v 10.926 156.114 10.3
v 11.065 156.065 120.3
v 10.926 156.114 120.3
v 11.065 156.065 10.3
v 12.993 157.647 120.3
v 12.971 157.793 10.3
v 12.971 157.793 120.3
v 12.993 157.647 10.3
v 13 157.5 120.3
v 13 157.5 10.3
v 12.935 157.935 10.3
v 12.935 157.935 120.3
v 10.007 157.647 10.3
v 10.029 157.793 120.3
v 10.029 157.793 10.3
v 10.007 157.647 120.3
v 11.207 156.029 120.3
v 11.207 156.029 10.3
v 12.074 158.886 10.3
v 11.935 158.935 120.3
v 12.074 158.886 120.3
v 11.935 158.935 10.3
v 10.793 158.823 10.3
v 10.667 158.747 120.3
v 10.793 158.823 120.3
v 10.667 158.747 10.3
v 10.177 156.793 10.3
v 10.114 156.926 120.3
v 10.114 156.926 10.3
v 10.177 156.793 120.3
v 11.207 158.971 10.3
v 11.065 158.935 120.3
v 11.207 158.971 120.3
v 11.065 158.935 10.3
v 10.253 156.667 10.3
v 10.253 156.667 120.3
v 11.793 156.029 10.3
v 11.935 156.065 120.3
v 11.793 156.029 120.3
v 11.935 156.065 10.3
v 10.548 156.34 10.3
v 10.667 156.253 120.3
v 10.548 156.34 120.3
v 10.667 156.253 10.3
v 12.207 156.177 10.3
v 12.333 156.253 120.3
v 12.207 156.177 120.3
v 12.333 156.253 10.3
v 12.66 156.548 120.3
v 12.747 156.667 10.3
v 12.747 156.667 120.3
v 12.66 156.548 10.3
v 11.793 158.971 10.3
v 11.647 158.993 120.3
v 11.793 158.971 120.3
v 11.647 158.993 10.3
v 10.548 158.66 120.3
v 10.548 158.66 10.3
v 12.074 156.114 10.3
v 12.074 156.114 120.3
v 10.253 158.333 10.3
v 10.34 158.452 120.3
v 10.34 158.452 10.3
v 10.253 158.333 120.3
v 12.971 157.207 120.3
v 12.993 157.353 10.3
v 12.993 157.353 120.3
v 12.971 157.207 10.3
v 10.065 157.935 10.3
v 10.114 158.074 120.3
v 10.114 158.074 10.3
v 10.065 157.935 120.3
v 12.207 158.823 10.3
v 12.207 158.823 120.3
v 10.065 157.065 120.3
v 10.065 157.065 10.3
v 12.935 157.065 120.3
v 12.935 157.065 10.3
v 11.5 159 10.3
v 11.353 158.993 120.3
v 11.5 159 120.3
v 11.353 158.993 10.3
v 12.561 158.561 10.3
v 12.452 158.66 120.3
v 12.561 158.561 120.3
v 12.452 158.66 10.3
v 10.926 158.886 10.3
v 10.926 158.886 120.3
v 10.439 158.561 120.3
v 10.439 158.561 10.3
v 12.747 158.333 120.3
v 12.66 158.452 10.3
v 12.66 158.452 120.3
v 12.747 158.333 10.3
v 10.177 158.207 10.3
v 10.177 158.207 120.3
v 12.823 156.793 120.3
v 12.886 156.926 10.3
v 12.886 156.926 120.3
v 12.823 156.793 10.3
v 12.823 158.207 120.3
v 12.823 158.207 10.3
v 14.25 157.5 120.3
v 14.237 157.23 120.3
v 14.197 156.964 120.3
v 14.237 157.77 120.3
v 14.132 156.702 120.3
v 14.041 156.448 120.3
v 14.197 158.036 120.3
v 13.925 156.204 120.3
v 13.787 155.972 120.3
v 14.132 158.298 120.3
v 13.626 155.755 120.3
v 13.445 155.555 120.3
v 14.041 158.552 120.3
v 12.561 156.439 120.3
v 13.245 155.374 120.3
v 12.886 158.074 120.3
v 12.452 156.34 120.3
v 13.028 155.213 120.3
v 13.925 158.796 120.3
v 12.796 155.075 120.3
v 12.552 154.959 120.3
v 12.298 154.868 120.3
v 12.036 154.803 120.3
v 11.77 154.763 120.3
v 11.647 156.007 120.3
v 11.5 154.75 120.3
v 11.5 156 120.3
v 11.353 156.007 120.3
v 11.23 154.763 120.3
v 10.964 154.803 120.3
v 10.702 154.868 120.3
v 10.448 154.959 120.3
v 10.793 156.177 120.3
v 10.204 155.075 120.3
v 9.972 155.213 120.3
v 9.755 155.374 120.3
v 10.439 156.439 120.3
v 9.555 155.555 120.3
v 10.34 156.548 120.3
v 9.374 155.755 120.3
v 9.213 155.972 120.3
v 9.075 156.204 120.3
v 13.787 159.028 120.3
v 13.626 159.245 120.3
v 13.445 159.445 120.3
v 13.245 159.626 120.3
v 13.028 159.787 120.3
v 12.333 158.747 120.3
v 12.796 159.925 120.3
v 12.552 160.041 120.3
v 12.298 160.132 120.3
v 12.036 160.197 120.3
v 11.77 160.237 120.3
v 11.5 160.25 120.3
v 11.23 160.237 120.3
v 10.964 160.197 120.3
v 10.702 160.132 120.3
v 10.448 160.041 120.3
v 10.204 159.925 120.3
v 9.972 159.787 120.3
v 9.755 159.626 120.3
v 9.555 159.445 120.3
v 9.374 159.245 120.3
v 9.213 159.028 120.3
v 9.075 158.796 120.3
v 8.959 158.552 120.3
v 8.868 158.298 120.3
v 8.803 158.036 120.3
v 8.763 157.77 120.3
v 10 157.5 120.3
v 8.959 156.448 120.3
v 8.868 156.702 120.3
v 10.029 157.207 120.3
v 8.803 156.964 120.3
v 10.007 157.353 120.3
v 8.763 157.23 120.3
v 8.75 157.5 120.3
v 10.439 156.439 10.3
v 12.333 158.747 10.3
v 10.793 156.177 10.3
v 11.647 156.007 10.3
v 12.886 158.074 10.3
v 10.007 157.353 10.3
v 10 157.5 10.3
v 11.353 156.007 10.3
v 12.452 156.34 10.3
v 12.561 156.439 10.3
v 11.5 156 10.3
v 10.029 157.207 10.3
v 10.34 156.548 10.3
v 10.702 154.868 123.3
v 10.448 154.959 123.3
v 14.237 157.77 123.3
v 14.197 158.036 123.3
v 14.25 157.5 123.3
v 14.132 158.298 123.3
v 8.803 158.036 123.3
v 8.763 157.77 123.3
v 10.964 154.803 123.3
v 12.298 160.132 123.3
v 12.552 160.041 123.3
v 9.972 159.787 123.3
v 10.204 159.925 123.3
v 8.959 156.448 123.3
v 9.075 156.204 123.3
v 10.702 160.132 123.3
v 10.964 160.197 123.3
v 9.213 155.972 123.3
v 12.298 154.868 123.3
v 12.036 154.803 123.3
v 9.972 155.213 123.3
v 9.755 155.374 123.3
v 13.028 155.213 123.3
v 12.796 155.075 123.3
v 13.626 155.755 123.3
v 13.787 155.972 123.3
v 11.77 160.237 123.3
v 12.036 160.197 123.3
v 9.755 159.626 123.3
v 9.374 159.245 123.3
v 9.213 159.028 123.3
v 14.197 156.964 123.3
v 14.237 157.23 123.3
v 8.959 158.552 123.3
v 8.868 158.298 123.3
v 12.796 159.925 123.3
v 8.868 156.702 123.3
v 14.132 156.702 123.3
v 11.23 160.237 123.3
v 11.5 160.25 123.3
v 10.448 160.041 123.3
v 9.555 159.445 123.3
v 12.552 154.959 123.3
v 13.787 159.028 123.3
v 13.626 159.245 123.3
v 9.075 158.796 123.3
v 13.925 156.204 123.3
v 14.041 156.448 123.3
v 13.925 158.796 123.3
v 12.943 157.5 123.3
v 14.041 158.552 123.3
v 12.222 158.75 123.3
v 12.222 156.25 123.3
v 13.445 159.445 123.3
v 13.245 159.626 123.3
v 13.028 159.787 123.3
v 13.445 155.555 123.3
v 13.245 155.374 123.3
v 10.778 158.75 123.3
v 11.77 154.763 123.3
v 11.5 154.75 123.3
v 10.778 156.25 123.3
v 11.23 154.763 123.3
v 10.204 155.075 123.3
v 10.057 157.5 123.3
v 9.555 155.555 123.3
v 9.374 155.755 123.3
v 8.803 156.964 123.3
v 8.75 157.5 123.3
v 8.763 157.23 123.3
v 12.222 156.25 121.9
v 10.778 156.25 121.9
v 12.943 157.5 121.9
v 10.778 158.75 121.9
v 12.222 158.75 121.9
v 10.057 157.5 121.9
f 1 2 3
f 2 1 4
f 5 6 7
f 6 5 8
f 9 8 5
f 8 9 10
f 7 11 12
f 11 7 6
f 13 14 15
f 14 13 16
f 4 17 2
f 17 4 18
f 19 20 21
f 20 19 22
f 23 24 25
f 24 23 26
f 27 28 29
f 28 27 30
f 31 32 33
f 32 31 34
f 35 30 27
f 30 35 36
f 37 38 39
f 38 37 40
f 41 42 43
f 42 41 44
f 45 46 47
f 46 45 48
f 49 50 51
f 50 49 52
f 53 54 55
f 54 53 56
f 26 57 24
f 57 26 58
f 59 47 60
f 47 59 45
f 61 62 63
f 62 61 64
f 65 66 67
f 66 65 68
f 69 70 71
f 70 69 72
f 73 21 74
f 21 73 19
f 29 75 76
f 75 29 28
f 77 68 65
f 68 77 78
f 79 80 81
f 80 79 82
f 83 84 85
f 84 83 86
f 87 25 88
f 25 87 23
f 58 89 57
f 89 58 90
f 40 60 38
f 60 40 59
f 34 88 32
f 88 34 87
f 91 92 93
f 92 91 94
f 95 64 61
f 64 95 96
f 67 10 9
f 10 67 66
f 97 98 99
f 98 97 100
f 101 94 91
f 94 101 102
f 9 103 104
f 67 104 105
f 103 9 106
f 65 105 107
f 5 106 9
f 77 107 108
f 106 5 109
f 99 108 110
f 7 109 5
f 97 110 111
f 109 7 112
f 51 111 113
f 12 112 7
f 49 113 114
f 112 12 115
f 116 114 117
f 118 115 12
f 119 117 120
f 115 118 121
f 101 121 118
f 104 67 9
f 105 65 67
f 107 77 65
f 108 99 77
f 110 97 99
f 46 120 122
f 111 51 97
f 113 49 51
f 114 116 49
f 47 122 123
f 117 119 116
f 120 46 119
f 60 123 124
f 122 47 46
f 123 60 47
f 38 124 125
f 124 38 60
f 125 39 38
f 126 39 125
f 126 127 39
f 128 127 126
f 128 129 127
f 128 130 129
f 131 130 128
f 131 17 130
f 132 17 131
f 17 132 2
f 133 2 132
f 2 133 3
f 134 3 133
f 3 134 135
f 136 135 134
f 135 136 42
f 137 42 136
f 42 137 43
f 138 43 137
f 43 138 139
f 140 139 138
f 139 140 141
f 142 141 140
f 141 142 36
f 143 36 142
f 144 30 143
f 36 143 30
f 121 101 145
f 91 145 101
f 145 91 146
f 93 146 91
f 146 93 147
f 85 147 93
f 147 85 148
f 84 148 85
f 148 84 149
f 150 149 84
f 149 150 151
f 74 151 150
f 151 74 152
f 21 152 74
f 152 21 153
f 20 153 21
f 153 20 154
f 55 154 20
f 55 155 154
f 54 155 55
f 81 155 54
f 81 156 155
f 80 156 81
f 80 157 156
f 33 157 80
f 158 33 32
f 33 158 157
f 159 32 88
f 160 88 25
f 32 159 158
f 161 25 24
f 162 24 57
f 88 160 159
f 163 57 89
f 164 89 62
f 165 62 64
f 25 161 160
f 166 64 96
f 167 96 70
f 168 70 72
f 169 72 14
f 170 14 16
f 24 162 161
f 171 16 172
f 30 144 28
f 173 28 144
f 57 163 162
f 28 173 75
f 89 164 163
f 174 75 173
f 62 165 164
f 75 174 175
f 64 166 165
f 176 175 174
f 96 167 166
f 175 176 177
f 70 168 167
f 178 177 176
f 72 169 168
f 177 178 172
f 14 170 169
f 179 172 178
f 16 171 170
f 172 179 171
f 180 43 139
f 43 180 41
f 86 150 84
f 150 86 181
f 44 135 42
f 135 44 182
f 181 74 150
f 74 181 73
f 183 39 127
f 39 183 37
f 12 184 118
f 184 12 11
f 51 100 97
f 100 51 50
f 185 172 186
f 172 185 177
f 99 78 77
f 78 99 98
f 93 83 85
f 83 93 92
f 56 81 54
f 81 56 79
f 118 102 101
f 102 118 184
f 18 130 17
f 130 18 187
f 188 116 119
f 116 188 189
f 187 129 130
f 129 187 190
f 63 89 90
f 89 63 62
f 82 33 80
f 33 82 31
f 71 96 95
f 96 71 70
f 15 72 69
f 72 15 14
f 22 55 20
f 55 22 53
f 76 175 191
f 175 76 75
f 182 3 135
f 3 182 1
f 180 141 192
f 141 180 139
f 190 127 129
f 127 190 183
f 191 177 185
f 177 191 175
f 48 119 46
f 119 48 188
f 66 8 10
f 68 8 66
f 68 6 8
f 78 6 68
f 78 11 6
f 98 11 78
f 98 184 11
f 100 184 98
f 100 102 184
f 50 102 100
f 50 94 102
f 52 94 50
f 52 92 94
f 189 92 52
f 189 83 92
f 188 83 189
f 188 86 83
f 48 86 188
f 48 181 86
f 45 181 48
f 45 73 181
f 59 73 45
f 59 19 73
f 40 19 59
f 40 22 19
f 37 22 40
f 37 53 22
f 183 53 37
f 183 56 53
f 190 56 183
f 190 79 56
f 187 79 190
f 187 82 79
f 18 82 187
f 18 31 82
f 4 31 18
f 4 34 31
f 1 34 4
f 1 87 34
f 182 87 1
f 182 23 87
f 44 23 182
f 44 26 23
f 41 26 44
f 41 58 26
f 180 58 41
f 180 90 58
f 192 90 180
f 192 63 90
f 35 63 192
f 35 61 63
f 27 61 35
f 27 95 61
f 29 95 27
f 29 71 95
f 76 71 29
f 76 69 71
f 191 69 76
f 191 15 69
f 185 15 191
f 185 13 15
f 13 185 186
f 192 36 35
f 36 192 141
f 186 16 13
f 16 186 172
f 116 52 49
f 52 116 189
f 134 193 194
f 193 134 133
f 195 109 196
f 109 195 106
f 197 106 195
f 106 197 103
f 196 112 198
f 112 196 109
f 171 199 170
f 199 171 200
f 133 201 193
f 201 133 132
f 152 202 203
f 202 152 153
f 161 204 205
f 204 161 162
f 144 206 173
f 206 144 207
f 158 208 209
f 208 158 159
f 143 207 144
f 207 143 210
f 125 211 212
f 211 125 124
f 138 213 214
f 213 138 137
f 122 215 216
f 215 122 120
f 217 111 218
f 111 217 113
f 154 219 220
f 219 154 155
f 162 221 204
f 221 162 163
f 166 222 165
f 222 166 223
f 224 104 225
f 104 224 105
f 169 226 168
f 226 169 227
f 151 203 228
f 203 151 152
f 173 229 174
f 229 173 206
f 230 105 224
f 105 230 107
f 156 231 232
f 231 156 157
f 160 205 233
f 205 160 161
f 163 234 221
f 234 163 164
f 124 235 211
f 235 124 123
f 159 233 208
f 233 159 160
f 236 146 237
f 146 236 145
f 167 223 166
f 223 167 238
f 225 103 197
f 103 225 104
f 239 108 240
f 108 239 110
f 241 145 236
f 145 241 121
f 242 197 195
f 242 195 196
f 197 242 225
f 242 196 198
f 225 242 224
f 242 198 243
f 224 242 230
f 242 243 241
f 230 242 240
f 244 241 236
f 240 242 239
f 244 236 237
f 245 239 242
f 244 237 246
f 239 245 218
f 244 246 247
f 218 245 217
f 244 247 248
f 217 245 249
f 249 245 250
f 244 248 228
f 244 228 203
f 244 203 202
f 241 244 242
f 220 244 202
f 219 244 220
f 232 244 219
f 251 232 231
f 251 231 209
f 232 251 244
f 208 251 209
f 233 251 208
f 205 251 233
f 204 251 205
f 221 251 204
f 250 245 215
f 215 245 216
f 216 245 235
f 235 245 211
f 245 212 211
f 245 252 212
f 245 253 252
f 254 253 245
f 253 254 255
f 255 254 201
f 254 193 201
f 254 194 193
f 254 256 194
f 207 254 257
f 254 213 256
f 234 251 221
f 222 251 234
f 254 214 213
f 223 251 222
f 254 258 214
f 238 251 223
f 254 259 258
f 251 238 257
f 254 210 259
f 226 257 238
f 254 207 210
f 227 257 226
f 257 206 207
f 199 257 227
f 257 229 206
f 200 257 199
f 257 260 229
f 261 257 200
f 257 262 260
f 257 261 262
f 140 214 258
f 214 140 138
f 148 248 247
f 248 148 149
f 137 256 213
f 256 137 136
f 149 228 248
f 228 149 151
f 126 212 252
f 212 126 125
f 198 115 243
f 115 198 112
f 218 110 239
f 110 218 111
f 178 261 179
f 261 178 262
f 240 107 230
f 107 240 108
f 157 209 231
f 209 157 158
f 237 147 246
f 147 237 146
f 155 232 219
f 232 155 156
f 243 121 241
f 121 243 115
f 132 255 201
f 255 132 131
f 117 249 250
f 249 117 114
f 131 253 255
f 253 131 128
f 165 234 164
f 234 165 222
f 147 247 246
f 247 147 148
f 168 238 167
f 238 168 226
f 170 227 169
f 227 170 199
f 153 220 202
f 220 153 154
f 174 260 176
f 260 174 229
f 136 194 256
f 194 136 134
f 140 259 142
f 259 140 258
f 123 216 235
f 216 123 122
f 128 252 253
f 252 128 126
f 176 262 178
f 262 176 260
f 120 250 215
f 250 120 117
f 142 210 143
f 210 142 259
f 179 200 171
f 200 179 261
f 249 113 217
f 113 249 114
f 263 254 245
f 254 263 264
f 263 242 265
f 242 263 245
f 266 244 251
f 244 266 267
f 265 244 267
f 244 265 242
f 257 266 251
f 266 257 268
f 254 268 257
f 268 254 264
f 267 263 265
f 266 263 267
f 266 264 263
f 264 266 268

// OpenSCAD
// Generated from the same CSG operations as STEP. Rebuild with spec/build_parent_hand_service.py.
difference(){union(){translate([11.5,157.5,10.3]) cylinder(r=1.5,h=110,$fn=64);translate([11.5,157.5,120.3]) cylinder(r=2.75,h=3,$fn=64);}translate([11.5,157.5,121.9]) cylinder(r=1.4433756729740643,h=1.5,$fn=6);}
